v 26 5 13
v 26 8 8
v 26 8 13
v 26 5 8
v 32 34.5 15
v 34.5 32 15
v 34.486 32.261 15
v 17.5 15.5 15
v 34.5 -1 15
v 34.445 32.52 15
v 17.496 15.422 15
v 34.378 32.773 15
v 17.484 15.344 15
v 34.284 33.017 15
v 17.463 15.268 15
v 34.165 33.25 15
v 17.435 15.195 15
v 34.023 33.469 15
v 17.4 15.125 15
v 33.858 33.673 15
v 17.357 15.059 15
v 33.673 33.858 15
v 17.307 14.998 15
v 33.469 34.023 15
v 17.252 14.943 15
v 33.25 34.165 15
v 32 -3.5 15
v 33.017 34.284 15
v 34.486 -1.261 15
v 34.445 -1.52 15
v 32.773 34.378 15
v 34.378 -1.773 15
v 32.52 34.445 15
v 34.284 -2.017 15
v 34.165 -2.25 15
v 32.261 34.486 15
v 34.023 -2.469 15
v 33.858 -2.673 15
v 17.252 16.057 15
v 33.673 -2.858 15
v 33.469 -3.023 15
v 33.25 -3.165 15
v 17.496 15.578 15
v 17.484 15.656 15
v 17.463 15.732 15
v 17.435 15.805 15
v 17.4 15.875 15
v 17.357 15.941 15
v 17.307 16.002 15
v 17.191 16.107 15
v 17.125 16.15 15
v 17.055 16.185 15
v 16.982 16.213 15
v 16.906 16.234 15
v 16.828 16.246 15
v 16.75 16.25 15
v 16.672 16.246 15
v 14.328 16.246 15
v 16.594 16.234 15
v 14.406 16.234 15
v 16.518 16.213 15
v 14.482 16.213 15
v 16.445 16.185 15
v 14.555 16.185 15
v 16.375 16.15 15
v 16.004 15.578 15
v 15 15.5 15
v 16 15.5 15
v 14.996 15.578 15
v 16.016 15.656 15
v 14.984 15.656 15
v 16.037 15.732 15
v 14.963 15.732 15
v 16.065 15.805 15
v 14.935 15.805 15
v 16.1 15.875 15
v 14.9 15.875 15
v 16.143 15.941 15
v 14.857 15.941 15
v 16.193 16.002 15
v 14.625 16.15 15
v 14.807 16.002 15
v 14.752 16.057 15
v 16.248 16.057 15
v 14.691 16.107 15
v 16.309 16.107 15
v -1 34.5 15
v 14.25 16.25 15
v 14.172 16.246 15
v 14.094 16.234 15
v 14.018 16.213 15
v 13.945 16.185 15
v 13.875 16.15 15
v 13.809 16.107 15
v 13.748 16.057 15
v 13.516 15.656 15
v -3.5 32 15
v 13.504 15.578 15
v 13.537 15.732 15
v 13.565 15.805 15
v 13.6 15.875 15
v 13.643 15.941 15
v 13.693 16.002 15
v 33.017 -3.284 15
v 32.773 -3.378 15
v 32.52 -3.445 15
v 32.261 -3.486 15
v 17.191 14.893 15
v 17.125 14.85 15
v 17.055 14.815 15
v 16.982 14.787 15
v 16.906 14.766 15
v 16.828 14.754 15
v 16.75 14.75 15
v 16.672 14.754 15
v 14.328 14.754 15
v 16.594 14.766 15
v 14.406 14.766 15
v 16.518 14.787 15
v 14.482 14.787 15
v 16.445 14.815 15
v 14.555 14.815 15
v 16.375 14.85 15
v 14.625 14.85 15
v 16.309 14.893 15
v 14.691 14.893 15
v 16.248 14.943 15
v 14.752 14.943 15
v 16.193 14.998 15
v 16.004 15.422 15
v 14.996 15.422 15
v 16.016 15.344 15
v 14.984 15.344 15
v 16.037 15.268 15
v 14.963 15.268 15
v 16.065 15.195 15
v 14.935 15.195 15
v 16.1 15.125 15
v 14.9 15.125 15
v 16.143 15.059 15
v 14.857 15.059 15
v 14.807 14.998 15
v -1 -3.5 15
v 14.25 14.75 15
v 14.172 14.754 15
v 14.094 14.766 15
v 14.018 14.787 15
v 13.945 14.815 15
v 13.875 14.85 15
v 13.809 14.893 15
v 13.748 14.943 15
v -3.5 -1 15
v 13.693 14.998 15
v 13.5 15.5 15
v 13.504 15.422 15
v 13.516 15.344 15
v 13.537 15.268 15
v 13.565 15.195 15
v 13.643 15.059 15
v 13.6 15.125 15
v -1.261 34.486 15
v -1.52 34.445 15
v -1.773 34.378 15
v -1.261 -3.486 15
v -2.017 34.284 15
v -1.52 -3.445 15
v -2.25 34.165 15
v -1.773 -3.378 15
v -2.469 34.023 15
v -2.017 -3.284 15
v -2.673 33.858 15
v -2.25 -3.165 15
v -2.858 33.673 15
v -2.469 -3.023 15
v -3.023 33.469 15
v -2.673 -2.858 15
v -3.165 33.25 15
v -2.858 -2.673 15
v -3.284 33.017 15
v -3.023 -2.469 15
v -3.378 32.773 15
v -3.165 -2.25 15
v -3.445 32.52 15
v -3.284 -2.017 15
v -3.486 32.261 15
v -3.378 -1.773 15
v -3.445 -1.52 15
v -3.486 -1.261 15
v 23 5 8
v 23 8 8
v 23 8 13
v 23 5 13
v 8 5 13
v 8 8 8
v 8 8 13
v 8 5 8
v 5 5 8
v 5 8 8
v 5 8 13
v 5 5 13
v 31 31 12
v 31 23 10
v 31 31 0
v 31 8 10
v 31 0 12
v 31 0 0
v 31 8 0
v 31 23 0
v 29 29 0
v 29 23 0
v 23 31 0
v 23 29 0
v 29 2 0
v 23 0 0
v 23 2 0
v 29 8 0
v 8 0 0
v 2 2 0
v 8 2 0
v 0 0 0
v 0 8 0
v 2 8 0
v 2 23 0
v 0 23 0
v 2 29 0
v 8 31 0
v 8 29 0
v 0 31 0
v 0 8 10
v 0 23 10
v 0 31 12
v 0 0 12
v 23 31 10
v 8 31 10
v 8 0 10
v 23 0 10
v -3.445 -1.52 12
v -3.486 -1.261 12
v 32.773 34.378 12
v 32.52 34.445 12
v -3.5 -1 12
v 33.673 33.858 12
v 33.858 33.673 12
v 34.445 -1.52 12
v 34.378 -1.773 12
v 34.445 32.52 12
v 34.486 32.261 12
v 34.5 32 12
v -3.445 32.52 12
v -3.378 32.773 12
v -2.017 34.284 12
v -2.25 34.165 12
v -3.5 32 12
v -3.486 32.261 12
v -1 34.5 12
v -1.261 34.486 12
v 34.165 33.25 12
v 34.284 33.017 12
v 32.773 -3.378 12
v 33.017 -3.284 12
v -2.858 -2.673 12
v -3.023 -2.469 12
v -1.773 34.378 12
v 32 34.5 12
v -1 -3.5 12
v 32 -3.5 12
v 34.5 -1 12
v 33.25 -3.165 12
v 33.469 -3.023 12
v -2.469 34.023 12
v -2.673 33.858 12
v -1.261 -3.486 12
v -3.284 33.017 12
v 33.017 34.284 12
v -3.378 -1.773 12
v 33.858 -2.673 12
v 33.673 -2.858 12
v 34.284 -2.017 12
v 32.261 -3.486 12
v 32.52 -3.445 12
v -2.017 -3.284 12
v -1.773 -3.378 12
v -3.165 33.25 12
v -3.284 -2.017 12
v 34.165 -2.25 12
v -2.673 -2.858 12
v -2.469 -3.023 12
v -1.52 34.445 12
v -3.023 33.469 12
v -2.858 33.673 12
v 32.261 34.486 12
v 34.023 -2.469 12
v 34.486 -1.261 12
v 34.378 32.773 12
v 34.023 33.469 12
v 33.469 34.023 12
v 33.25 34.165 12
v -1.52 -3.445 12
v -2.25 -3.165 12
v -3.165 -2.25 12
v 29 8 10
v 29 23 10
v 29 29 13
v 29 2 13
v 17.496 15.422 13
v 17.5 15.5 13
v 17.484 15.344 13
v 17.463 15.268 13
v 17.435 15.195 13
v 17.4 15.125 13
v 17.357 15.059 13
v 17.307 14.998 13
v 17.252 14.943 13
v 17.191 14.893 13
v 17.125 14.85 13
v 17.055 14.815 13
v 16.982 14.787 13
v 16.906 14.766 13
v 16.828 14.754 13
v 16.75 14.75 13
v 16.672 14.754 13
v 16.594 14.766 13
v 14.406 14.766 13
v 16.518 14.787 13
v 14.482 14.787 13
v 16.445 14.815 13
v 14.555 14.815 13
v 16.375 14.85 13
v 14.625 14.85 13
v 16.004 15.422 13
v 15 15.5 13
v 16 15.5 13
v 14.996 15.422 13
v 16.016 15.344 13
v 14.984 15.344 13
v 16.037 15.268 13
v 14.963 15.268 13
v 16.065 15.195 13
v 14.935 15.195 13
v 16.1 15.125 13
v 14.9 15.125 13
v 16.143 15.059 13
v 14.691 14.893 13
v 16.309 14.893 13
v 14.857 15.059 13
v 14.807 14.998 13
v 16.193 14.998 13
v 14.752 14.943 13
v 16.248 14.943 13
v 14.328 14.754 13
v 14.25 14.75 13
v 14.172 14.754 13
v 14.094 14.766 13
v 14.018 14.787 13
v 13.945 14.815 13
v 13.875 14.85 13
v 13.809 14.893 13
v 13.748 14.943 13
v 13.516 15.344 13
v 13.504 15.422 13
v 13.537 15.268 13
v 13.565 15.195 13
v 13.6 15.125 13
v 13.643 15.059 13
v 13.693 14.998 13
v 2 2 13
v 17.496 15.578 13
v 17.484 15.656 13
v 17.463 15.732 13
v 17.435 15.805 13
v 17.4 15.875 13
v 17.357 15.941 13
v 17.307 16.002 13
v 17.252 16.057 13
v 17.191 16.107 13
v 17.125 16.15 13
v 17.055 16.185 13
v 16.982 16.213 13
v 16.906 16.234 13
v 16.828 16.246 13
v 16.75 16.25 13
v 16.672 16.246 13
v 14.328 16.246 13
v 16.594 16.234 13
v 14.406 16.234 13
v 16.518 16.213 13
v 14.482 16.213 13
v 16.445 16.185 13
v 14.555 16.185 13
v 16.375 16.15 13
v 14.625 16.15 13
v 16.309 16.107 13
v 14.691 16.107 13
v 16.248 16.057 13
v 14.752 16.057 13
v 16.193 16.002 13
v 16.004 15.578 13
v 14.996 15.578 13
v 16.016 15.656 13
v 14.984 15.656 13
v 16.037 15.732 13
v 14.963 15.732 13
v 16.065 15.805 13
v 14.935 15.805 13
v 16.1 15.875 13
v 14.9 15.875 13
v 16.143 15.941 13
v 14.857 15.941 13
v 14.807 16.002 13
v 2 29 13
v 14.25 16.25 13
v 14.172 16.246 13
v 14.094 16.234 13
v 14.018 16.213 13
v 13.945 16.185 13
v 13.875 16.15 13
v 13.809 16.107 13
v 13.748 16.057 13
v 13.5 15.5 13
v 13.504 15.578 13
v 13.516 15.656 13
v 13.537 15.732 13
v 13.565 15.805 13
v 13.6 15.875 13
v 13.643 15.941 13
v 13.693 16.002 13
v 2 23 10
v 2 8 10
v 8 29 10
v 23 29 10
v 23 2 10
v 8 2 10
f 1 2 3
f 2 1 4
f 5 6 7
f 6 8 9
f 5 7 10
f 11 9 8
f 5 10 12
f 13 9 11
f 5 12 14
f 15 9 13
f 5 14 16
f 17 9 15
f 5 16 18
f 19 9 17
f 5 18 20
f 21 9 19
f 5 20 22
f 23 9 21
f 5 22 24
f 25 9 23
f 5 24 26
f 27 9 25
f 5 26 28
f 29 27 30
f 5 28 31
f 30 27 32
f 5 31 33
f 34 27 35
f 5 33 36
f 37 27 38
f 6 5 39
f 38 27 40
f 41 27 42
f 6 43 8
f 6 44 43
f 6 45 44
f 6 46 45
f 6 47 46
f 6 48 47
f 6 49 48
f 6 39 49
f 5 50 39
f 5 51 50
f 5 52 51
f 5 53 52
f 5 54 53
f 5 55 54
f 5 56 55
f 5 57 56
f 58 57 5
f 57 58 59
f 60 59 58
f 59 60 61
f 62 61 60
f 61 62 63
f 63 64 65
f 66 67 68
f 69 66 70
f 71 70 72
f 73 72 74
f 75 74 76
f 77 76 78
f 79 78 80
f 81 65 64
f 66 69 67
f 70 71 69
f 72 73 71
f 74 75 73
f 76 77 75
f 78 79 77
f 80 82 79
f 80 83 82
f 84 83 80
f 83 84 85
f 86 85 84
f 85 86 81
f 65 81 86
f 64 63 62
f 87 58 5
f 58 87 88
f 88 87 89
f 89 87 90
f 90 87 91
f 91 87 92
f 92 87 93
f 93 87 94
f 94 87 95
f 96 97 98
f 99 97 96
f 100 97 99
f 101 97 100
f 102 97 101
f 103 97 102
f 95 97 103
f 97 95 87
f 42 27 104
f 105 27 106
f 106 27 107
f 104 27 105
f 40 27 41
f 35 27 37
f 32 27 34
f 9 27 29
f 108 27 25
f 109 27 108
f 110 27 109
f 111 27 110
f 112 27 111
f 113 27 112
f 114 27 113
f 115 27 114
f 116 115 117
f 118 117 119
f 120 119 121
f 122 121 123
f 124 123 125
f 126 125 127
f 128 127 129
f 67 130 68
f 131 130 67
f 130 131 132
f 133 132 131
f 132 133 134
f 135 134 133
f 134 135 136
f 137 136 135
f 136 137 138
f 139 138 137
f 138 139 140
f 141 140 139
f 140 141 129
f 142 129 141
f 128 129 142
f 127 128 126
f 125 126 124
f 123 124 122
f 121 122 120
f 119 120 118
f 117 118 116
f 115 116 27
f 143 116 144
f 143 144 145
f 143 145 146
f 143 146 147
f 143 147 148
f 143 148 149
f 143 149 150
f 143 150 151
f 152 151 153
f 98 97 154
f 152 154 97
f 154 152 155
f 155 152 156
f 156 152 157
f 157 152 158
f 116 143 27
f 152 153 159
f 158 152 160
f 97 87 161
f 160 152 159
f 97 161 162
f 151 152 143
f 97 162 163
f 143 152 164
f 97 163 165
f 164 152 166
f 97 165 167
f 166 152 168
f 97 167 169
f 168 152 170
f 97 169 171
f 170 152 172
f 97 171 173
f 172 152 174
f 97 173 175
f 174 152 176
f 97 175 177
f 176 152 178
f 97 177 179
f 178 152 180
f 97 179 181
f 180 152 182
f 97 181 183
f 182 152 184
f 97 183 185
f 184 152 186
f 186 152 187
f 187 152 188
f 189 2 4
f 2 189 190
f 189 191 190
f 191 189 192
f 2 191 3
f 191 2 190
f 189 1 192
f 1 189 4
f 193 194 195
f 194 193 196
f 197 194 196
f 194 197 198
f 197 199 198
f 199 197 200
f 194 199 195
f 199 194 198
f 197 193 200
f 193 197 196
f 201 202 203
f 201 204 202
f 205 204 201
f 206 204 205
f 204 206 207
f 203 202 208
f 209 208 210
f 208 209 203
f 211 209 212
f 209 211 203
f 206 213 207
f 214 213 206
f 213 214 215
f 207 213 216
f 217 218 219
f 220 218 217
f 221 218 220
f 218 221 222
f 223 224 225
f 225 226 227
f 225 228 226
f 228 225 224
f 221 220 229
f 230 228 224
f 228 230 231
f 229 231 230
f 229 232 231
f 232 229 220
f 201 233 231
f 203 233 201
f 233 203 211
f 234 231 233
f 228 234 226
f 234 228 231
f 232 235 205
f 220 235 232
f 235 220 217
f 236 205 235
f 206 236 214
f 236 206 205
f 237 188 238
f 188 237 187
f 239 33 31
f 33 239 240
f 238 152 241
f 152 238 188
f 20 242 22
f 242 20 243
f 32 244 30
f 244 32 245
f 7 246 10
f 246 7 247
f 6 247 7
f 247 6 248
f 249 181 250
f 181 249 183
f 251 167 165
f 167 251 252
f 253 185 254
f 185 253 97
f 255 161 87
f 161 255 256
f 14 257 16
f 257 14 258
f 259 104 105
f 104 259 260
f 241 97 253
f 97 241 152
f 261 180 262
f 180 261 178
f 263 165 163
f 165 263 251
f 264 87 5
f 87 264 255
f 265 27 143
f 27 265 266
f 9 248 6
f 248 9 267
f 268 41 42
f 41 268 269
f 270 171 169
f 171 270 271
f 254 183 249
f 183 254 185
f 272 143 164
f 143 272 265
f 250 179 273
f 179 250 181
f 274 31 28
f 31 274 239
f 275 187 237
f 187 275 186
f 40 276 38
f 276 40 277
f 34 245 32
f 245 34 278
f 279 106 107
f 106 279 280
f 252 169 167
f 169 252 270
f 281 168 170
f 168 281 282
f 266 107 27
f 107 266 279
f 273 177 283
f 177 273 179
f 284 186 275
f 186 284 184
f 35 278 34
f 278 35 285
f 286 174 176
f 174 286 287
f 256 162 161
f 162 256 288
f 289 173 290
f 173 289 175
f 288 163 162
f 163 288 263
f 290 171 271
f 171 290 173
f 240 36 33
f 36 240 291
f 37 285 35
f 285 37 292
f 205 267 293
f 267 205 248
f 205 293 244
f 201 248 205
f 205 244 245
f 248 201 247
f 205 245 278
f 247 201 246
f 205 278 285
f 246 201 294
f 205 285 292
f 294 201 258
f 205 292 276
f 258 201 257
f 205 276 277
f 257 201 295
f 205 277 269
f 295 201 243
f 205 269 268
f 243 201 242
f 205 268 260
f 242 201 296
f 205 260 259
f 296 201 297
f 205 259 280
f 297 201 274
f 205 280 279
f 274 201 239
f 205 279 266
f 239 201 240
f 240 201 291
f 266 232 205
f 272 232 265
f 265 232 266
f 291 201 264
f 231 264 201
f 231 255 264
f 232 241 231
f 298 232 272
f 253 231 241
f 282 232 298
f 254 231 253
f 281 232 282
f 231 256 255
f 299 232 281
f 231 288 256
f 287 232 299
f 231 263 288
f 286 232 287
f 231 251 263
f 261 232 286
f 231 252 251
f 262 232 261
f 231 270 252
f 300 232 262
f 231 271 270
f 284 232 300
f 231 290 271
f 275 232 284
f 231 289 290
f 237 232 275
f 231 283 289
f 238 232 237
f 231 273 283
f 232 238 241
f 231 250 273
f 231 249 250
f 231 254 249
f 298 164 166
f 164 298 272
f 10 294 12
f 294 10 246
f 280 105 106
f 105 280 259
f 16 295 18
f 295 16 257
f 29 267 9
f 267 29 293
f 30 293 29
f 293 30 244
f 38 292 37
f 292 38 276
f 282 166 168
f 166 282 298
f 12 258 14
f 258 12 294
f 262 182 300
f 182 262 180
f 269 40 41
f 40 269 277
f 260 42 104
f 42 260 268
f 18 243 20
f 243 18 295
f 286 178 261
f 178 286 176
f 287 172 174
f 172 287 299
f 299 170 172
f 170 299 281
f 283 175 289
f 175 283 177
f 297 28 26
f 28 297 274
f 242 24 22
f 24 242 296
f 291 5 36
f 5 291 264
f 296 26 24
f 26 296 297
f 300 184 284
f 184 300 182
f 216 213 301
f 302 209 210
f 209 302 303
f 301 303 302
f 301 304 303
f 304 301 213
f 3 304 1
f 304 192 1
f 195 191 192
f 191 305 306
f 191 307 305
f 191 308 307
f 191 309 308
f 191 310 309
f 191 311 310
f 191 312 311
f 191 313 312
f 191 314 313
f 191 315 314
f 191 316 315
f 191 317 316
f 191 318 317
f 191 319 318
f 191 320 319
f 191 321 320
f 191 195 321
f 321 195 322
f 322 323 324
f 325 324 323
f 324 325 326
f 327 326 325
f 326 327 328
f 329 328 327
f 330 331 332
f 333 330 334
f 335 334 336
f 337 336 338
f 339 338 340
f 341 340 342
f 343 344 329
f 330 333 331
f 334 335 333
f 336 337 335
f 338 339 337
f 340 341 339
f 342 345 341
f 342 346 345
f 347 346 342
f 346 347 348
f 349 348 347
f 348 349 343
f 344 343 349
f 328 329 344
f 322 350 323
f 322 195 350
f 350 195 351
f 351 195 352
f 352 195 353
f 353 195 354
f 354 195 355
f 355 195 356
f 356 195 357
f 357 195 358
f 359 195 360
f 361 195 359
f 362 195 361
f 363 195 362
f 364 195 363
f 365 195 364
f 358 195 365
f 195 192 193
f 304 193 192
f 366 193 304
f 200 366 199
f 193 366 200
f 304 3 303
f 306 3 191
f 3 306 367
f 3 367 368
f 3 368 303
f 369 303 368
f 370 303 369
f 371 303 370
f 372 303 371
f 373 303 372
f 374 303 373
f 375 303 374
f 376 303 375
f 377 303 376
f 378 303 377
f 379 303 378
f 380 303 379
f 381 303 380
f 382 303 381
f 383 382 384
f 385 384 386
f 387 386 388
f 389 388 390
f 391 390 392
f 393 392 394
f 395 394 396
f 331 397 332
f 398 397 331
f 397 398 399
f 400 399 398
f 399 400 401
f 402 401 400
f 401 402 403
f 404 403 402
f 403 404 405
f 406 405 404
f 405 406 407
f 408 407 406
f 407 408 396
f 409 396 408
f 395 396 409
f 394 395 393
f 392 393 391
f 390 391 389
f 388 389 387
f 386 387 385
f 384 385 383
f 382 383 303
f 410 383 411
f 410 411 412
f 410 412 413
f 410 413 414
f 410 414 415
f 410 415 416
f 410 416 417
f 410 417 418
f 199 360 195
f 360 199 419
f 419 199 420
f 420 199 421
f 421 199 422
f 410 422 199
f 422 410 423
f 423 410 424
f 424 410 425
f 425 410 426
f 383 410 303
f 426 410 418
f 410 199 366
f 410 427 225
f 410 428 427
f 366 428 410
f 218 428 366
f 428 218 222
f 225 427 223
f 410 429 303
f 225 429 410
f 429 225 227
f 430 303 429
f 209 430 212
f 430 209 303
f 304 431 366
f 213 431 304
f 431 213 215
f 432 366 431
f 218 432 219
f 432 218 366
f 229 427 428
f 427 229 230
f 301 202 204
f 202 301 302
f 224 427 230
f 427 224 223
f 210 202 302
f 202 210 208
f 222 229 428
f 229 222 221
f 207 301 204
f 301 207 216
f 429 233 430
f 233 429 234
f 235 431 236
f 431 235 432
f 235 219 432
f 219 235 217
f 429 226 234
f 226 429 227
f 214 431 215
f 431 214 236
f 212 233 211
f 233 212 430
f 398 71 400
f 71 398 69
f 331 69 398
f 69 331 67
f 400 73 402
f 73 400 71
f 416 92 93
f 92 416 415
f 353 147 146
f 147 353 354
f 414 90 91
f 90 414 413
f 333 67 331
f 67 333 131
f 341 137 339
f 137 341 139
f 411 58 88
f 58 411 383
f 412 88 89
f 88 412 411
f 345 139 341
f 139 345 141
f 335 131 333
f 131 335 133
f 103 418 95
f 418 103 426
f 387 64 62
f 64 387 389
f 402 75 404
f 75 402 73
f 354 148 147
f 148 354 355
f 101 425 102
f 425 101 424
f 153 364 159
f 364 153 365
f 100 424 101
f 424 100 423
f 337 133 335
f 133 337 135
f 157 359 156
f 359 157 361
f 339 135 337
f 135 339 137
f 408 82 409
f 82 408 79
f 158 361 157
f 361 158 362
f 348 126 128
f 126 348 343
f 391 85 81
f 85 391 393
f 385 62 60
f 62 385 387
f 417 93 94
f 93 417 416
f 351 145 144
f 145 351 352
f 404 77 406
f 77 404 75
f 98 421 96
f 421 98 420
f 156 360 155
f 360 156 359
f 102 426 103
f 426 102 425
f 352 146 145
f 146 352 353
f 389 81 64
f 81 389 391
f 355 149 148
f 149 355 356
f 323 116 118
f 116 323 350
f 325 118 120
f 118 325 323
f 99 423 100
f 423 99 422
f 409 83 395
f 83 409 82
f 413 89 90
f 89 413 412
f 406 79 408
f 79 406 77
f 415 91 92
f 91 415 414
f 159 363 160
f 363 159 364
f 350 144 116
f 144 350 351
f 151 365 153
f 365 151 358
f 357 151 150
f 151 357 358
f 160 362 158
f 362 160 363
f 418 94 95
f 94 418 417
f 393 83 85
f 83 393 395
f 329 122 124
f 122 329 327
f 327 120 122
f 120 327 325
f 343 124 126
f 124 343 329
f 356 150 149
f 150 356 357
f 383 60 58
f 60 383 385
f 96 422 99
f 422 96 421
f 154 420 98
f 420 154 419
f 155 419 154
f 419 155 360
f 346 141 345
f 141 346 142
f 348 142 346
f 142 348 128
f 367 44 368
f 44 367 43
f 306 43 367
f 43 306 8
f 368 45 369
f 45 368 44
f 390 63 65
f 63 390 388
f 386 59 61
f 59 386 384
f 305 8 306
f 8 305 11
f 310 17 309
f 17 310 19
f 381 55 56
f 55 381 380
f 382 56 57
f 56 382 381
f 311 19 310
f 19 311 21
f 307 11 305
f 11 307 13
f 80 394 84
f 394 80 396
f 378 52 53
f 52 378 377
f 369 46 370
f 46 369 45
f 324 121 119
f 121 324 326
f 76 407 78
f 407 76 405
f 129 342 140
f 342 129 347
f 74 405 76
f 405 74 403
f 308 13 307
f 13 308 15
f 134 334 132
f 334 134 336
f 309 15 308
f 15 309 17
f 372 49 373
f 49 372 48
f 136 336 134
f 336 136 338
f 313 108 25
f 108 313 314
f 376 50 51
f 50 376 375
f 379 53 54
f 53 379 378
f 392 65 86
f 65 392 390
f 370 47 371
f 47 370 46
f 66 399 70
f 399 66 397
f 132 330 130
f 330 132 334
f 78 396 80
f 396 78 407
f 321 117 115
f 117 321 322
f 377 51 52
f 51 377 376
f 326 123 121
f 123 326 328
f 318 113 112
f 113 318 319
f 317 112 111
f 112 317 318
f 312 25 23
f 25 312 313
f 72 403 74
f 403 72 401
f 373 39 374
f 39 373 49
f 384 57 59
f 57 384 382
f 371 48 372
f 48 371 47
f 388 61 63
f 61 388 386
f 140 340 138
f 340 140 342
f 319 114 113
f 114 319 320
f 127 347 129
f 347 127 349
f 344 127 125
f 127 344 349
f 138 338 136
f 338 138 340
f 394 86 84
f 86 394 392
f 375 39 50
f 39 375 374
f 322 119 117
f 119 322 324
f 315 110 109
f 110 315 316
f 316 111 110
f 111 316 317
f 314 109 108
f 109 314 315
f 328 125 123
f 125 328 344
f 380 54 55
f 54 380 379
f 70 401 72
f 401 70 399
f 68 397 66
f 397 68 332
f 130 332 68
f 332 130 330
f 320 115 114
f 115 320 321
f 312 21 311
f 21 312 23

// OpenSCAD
// file: ../_selector_params.scad
// Ansible widget cases
//
// Parameters specific to selector types
// -----------------------------------------------------------------------------

// Magnet selector

MAGNET_BOARD_WIDTH = 23;
MAGNET_BOARD_HEIGHT = 21;

MAGNET_HOLE_OFFSET = 2;
MAGNET_HOLE_WIDTH = MAGNET_BOARD_WIDTH - MAGNET_HOLE_OFFSET;
MAGNET_HOLE_LENGTH = 10.5;

MAGNET_BOARD_INSET = 1;
MAGNET_BOARD_INSET_WIDTH = MAGNET_BOARD_WIDTH + MAGNET_BOARD_INSET;
MAGNET_BOARD_INSET_HEIGHT = MAGNET_BOARD_HEIGHT + MAGNET_BOARD_INSET;
MAGNET_BOARD_INSET_DEPTH = 1;

MAGNET_PEG_HEIGHT = 4;
MAGNET_PEG_RADIUS_BASE = 2.5 / 2;
MAGNET_PEG_RADIUS_TOP = 1.75 / 2;
MAGNET_PEG_OFFSET_X = -0.25;
MAGNET_PEG_OFFSET_Y = 0.7;
MAGNET_PEG_OFFSET_Z = -MAGNET_BOARD_INSET;

MAGNET_PEG_HOLE_RADIUS = 2.5 / 2;
MAGNET_PEG_HOLE_OFFSET_X = 1 + MAGNET_PEG_HOLE_RADIUS;
MAGNET_PEG_HOLE_OFFSET_Y = 1 + MAGNET_PEG_HOLE_RADIUS;

// -----------------------------------------------------------------------------

// Light selector

LIGHT_BOARD_WIDTH = 19;
LIGHT_BOARD_HEIGHT = 16;

LIGHT_HOLE_OFFSET = 2;
LIGHT_HOLE_WIDTH = LIGHT_BOARD_WIDTH - LIGHT_HOLE_OFFSET;
LIGHT_HOLE_LENGTH = 8;

LIGHT_BOARD_INSET = 1;
LIGHT_BOARD_INSET_WIDTH = LIGHT_BOARD_WIDTH + LIGHT_BOARD_INSET;
LIGHT_BOARD_INSET_HEIGHT = LIGHT_BOARD_HEIGHT + LIGHT_BOARD_INSET;
LIGHT_BOARD_INSET_DEPTH = 1;

LIGHT_PEG_HEIGHT = 4;
LIGHT_PEG_RADIUS_BASE = 2.5 / 2;
LIGHT_PEG_RADIUS_TOP = 1.75 / 2;
LIGHT_PEG_OFFSET_X = 1.65;
LIGHT_PEG_OFFSET_Y = 3.65;
LIGHT_PEG_OFFSET_Z = -LIGHT_BOARD_INSET;

LIGHT_PEG_HOLE_RADIUS = 2.3 / 2;
LIGHT_PEG_HOLE_OFFSET_X = 1 + LIGHT_PEG_HOLE_RADIUS;
LIGHT_PEG_HOLE_OFFSET_Y = 1.5 + LIGHT_PEG_HOLE_RADIUS;
// file: ../_widget_params.scad
// Ansible widget cases
//
// Parameters specific to widget types
// -----------------------------------------------------------------------------

// LED widget

LED_LEAD_DISTANCE = 2.5; // 2.5mm apart

LED_HOLE_RADIUS = 1.5 / 2;

LED_SHELF_WIDTH = 3;
LED_SHELF_HEIGHT = 7;

LED_SHELF_X = 23;
LED_SHELF_Y = 5;

LED_SHELF2_X = 5;
LED_SHELF2_Y = 5;
// file: _mount.scad
// Ansible widget cases
//
// Mount: base mount for widgets
// -----------------------------------------------------------------------------

include <../params.scad>;

// -----------------------------------------------------------------------------

module widget_mount() {
	color(WIDGET_MOUNT_COLOR) {
		// Square base
		difference() {
			// Outside
			union() {
				// Base
				cube([WIDGET_MOUNT_SIZE, WIDGET_MOUNT_SIZE, MOUNT_HEIGHT]);
				
				// Grip
				translate([
					-GRIP_THICKNESS / 2,
					-GRIP_THICKNESS / 2,
					MOUNT_HEIGHT - GRIP_HEIGHT
				])
					linear_extrude(height=GRIP_HEIGHT)
					hull() {
						translate([
							0,
							0,
							0
						])
							circle(r=WIDGET_BORDER_RADIUS, $fn=SEGMENTS);
					
						translate([
							WIDGET_MOUNT_SIZE + GRIP_THICKNESS,
							0,
							0
						])
							circle(r=WIDGET_BORDER_RADIUS, $fn=SEGMENTS);
					
						translate([
							0,
							WIDGET_MOUNT_SIZE + GRIP_THICKNESS,
							0,
						])
							circle(r=WIDGET_BORDER_RADIUS, $fn=SEGMENTS);
					
						translate([
							WIDGET_MOUNT_SIZE + GRIP_THICKNESS,
							WIDGET_MOUNT_SIZE + GRIP_THICKNESS,
							0,
						])
							circle(r=WIDGET_BORDER_RADIUS, $fn=SEGMENTS);
					}
			}
			
			// Carve out inside
			translate([
				WIDGET_MOUNT_THICKNESS,
				WIDGET_MOUNT_THICKNESS,
				-WIDGET_MOUNT_THICKNESS
			])
				cube([
					WIDGET_MOUNT_SIZE - WIDGET_MOUNT_THICKNESS * 2,
					WIDGET_MOUNT_SIZE - WIDGET_MOUNT_THICKNESS * 2,
					MOUNT_HEIGHT
				]);

			// Carve out notches
			translate([
				-WIDGET_MOUNT_THICKNESS - 5,
				(WIDGET_MOUNT_SIZE / 2) - (WIDGET_MOUNT_NOTCH_SIZE / 2),
				-2
			])
				cube([
					WIDGET_MOUNT_SIZE + WIDGET_MOUNT_THICKNESS + 10,
					WIDGET_MOUNT_NOTCH_SIZE,
					WIDGET_MOUNT_NOTCH_HEIGHT + 2
				]);

			translate([
				WIDGET_MOUNT_SIZE / 2 + WIDGET_MOUNT_NOTCH_SIZE / 2,
				-WIDGET_MOUNT_SIZE / 2 + WIDGET_MOUNT_THICKNESS + 10,
				-2
			])
			rotate([0, 0, 90])
				cube([
					WIDGET_MOUNT_SIZE + WIDGET_MOUNT_THICKNESS + 10,
					WIDGET_MOUNT_NOTCH_SIZE,
					WIDGET_MOUNT_NOTCH_HEIGHT + 2
				]);
		}
	}
}
// file: ../params.scad
// Ansible widget cases
//
// Params: case parameters
// -----------------------------------------------------------------------------

// Overall case
CASE_WIDTH = 90;
CASE_LENGTH = 140;
CASE_HEIGHT = 55;
WALL_THICKNESS = 3;
FLOOR_THICKNESS = WALL_THICKNESS;
SEGMENTS = 60;

// -----------------------------------------------------------------------------

// Front door
FRONT_DOOR_THICKNESS = 3;
FRONT_DOOR_INSET = 1;  // how much gap to give
FRONT_DOOR_OFFSET_Y = 4; // how far in from the edge
FRONT_DOOR_WIDTH = CASE_WIDTH - WALL_THICKNESS - FRONT_DOOR_INSET;
FRONT_DOOR_HEIGHT = CASE_HEIGHT - (WALL_THICKNESS * 2) + (FRONT_DOOR_INSET * 2);

// -----------------------------------------------------------------------------

// Pi shelf
SHELF_THICKNESS = WALL_THICKNESS - 1;
SHELF_Y = 47;
SHELF_LENGTH = 35;
SHELF_HEIGHT = 28;
SHELF_PEG_OFFSET_X = 3.5;
SHELF_PEG_OFFSET_Y = 3.0;
SHELF_PEG_HEIGHT = 4;
SHELF_PEG_RADIUS_BASE = 2.5 / 2;
SHELF_PEG_RADIUS_TOP = 1.75 / 2;

SHELF_HOLE_WIDTH = CASE_WIDTH * 0.5;
SHELF_HOLE_LENGTH = SHELF_LENGTH * 0.6;
SHELF_HOLE_OFFSET_Y = 8;

// -----------------------------------------------------------------------------

// Lid
LID_THICKNESS = 2;
DOCK_BORDER_HEIGHT = 9;
DOCK_BORDER_THICKNESS = 2;
DOCK_INSET = 2;

// Lid ridge
RIDGE_THICKNESS = WALL_THICKNESS * 2;
RIDGE_PEG_HEIGHT = 4;
RIDGE_PEG_RADIUS_BASE = 2.5 / 2;
RIDGE_PEG_RADIUS_TOP = 1.75 / 2;
RIDGE_PEG_RADIUS_HOLE = 2.3 / 2;
RIDGE_PEG_OFFSET = 5;

// -----------------------------------------------------------------------------

// General mount
MOUNT_HEIGHT = 15;
MOUNT_THICKNESS = 3;
MOUNT_SEGMENTS = 360;
GRIP_HEIGHT = 3;
GRIP_THICKNESS = 2;
LABEL_MOUNT_HEIGHT = 1;
LABEL_MOUNT_FONT_SIZE = 6;
LABEL_MOUNT_FONT = "Avenir Pro:style=Bold";

// Selector dock
SELECTOR_DOCK_Y = CASE_LENGTH * .78;
SELECTOR_DOCK_RADIUS = 18;
SELECTOR_DOCK_BORDER_RADIUS = SELECTOR_DOCK_RADIUS + DOCK_BORDER_THICKNESS;
SELECTOR_HOLE_OFFSET = DOCK_BORDER_THICKNESS;
SELECTOR_HOLE_SIZE = SELECTOR_DOCK_RADIUS - SELECTOR_HOLE_OFFSET;
SELECTOR_LABEL_Y = -SELECTOR_DOCK_RADIUS + 1;

// Selector mount
SELECTOR_MOUNT_COLOR = [0.6, 0.6, 0.8];
SELECTOR_MOUNT_OFFSET = 0.5;
SELECTOR_MOUNT_THICKNESS = WALL_THICKNESS;
SELECTOR_MOUNT_RADIUS = SELECTOR_DOCK_RADIUS - SELECTOR_MOUNT_OFFSET;
SELECTOR_HOLE_RADIUS = SELECTOR_MOUNT_RADIUS - SELECTOR_HOLE_OFFSET;

SELECTOR_MOUNT_NOTCH_SIZE = 15;
SELECTOR_MOUNT_NOTCH_HEIGHT = MOUNT_HEIGHT - 5;

// Widget dock
WIDGET_DOCK_Y = CASE_LENGTH * .15;
WIDGET_DOCK_SIZE = 32;
WIDGET_BORDER_RADIUS = 2.5;
WIDGET_HOLE_OFFSET = DOCK_BORDER_THICKNESS * 2;
WIDGET_HOLE_SIZE = WIDGET_DOCK_SIZE - WIDGET_HOLE_OFFSET;

// Widget mount
WIDGET_MOUNT_COLOR = [0.6, 0.8, 0.6];
WIDGET_MOUNT_OFFSET = 1;
WIDGET_MOUNT_THICKNESS = 2;
WIDGET_MOUNT_SIZE = WIDGET_DOCK_SIZE - WIDGET_MOUNT_OFFSET;
WIDGET_MOUNT_HOLE_SIZE = WIDGET_MOUNT_SIZE - WIDGET_HOLE_OFFSET;

WIDGET_MOUNT_NOTCH_SIZE = 15;
WIDGET_MOUNT_NOTCH_HEIGHT = MOUNT_HEIGHT - 5;

// -----------------------------------------------------------------------------

// Pi
PI_COLOR = [0.3, 0.4, 0.3];
PI_Y = SHELF_Y + 5;
PI_WIDTH = 66.04;
PI_LENGTH = 30.48;
PI_DEPTH = 1.5;
PI_HOLE_RADIUS = 2 / 2;
PI_HOLE_OFFSET_X = 3.5;
PI_HOLE_OFFSET_Y = 3.0;

// Battery pack
BATTERY_COLOR = [0.2, 0.2, 0.2];
BATTERY_WIDTH = 68.58;
BATTERY_LENGTH = 96.52;
BATTERY_DEPTH = 22.86;

BATTERY_DIAMETER = 23;

BATTERY_GUIDE_OFFSET_X = -5.5;
BATTERY_GUIDE_WIDTH = 4;
BATTERY_GUIDE_HEIGHT = 4;
BATTERY_GUIDE_OFFSET_Y = 30;
BATTERY_GUIDE_LENGTH = 40;

// -----------------------------------------------------------------------------

// Floor hole
FLOOR_HOLE_WIDTH = BATTERY_WIDTH * .6;
FLOOR_HOLE_LENGTH = BATTERY_LENGTH * .8;

// -----------------------------------------------------------------------------

// Hatching

HATCH_FRAME_OFFSET = 5;
HATCH_SIZE = 6;
HATCH_GAP = 10;
SIDE_HATCH_LENGTH = CASE_LENGTH - 15;

// -----------------------------------------------------------------------------

include <_widget_params.scad>;
include <_selector_params.scad>;
// main file
// Ansible widget cases
//
// LED widget w/ mount
// -----------------------------------------------------------------------------

include <../params.scad>;
use <_mount.scad>;

// -----------------------------------------------------------------------------

module led_widget() {
    union() {        
		// Shelf
		_led_shelf();

        // Cut out hole for wires
        difference() {
            // Mount
            widget_mount();
            
            // Lead holes
			_lead_holes();
        }
    }
}

// -----------------------------------------------------------------------------

module _lead_holes() {
	// Lead holes
	translate([
		WIDGET_MOUNT_SIZE / 2 - LED_LEAD_DISTANCE / 2,
		WIDGET_MOUNT_SIZE / 2,
		MOUNT_HEIGHT - 5
	])
		cylinder(10, LED_HOLE_RADIUS, LED_HOLE_RADIUS, $fn=SEGMENTS);

	translate([
		WIDGET_MOUNT_SIZE / 2 + LED_LEAD_DISTANCE / 2,
		WIDGET_MOUNT_SIZE / 2,
		MOUNT_HEIGHT - 5
	])
		cylinder(10, LED_HOLE_RADIUS, LED_HOLE_RADIUS, $fn=SEGMENTS);
}

// -----------------------------------------------------------------------------

module _led_shelf() {
	// Shelf for wiring
	translate([
		LED_SHELF_X,
		LED_SHELF_Y,
		MOUNT_HEIGHT - LED_SHELF_HEIGHT,
	])
		cube([LED_SHELF_WIDTH, LED_SHELF_WIDTH, LED_SHELF_HEIGHT]);

	// Shelf for wiring
	translate([
		LED_SHELF2_X,
		LED_SHELF2_Y,
		MOUNT_HEIGHT - LED_SHELF_HEIGHT,
	])
		cube([LED_SHELF_WIDTH, LED_SHELF_WIDTH, LED_SHELF_HEIGHT]);
}

// -----------------------------------------------------------------------------

led_widget();
